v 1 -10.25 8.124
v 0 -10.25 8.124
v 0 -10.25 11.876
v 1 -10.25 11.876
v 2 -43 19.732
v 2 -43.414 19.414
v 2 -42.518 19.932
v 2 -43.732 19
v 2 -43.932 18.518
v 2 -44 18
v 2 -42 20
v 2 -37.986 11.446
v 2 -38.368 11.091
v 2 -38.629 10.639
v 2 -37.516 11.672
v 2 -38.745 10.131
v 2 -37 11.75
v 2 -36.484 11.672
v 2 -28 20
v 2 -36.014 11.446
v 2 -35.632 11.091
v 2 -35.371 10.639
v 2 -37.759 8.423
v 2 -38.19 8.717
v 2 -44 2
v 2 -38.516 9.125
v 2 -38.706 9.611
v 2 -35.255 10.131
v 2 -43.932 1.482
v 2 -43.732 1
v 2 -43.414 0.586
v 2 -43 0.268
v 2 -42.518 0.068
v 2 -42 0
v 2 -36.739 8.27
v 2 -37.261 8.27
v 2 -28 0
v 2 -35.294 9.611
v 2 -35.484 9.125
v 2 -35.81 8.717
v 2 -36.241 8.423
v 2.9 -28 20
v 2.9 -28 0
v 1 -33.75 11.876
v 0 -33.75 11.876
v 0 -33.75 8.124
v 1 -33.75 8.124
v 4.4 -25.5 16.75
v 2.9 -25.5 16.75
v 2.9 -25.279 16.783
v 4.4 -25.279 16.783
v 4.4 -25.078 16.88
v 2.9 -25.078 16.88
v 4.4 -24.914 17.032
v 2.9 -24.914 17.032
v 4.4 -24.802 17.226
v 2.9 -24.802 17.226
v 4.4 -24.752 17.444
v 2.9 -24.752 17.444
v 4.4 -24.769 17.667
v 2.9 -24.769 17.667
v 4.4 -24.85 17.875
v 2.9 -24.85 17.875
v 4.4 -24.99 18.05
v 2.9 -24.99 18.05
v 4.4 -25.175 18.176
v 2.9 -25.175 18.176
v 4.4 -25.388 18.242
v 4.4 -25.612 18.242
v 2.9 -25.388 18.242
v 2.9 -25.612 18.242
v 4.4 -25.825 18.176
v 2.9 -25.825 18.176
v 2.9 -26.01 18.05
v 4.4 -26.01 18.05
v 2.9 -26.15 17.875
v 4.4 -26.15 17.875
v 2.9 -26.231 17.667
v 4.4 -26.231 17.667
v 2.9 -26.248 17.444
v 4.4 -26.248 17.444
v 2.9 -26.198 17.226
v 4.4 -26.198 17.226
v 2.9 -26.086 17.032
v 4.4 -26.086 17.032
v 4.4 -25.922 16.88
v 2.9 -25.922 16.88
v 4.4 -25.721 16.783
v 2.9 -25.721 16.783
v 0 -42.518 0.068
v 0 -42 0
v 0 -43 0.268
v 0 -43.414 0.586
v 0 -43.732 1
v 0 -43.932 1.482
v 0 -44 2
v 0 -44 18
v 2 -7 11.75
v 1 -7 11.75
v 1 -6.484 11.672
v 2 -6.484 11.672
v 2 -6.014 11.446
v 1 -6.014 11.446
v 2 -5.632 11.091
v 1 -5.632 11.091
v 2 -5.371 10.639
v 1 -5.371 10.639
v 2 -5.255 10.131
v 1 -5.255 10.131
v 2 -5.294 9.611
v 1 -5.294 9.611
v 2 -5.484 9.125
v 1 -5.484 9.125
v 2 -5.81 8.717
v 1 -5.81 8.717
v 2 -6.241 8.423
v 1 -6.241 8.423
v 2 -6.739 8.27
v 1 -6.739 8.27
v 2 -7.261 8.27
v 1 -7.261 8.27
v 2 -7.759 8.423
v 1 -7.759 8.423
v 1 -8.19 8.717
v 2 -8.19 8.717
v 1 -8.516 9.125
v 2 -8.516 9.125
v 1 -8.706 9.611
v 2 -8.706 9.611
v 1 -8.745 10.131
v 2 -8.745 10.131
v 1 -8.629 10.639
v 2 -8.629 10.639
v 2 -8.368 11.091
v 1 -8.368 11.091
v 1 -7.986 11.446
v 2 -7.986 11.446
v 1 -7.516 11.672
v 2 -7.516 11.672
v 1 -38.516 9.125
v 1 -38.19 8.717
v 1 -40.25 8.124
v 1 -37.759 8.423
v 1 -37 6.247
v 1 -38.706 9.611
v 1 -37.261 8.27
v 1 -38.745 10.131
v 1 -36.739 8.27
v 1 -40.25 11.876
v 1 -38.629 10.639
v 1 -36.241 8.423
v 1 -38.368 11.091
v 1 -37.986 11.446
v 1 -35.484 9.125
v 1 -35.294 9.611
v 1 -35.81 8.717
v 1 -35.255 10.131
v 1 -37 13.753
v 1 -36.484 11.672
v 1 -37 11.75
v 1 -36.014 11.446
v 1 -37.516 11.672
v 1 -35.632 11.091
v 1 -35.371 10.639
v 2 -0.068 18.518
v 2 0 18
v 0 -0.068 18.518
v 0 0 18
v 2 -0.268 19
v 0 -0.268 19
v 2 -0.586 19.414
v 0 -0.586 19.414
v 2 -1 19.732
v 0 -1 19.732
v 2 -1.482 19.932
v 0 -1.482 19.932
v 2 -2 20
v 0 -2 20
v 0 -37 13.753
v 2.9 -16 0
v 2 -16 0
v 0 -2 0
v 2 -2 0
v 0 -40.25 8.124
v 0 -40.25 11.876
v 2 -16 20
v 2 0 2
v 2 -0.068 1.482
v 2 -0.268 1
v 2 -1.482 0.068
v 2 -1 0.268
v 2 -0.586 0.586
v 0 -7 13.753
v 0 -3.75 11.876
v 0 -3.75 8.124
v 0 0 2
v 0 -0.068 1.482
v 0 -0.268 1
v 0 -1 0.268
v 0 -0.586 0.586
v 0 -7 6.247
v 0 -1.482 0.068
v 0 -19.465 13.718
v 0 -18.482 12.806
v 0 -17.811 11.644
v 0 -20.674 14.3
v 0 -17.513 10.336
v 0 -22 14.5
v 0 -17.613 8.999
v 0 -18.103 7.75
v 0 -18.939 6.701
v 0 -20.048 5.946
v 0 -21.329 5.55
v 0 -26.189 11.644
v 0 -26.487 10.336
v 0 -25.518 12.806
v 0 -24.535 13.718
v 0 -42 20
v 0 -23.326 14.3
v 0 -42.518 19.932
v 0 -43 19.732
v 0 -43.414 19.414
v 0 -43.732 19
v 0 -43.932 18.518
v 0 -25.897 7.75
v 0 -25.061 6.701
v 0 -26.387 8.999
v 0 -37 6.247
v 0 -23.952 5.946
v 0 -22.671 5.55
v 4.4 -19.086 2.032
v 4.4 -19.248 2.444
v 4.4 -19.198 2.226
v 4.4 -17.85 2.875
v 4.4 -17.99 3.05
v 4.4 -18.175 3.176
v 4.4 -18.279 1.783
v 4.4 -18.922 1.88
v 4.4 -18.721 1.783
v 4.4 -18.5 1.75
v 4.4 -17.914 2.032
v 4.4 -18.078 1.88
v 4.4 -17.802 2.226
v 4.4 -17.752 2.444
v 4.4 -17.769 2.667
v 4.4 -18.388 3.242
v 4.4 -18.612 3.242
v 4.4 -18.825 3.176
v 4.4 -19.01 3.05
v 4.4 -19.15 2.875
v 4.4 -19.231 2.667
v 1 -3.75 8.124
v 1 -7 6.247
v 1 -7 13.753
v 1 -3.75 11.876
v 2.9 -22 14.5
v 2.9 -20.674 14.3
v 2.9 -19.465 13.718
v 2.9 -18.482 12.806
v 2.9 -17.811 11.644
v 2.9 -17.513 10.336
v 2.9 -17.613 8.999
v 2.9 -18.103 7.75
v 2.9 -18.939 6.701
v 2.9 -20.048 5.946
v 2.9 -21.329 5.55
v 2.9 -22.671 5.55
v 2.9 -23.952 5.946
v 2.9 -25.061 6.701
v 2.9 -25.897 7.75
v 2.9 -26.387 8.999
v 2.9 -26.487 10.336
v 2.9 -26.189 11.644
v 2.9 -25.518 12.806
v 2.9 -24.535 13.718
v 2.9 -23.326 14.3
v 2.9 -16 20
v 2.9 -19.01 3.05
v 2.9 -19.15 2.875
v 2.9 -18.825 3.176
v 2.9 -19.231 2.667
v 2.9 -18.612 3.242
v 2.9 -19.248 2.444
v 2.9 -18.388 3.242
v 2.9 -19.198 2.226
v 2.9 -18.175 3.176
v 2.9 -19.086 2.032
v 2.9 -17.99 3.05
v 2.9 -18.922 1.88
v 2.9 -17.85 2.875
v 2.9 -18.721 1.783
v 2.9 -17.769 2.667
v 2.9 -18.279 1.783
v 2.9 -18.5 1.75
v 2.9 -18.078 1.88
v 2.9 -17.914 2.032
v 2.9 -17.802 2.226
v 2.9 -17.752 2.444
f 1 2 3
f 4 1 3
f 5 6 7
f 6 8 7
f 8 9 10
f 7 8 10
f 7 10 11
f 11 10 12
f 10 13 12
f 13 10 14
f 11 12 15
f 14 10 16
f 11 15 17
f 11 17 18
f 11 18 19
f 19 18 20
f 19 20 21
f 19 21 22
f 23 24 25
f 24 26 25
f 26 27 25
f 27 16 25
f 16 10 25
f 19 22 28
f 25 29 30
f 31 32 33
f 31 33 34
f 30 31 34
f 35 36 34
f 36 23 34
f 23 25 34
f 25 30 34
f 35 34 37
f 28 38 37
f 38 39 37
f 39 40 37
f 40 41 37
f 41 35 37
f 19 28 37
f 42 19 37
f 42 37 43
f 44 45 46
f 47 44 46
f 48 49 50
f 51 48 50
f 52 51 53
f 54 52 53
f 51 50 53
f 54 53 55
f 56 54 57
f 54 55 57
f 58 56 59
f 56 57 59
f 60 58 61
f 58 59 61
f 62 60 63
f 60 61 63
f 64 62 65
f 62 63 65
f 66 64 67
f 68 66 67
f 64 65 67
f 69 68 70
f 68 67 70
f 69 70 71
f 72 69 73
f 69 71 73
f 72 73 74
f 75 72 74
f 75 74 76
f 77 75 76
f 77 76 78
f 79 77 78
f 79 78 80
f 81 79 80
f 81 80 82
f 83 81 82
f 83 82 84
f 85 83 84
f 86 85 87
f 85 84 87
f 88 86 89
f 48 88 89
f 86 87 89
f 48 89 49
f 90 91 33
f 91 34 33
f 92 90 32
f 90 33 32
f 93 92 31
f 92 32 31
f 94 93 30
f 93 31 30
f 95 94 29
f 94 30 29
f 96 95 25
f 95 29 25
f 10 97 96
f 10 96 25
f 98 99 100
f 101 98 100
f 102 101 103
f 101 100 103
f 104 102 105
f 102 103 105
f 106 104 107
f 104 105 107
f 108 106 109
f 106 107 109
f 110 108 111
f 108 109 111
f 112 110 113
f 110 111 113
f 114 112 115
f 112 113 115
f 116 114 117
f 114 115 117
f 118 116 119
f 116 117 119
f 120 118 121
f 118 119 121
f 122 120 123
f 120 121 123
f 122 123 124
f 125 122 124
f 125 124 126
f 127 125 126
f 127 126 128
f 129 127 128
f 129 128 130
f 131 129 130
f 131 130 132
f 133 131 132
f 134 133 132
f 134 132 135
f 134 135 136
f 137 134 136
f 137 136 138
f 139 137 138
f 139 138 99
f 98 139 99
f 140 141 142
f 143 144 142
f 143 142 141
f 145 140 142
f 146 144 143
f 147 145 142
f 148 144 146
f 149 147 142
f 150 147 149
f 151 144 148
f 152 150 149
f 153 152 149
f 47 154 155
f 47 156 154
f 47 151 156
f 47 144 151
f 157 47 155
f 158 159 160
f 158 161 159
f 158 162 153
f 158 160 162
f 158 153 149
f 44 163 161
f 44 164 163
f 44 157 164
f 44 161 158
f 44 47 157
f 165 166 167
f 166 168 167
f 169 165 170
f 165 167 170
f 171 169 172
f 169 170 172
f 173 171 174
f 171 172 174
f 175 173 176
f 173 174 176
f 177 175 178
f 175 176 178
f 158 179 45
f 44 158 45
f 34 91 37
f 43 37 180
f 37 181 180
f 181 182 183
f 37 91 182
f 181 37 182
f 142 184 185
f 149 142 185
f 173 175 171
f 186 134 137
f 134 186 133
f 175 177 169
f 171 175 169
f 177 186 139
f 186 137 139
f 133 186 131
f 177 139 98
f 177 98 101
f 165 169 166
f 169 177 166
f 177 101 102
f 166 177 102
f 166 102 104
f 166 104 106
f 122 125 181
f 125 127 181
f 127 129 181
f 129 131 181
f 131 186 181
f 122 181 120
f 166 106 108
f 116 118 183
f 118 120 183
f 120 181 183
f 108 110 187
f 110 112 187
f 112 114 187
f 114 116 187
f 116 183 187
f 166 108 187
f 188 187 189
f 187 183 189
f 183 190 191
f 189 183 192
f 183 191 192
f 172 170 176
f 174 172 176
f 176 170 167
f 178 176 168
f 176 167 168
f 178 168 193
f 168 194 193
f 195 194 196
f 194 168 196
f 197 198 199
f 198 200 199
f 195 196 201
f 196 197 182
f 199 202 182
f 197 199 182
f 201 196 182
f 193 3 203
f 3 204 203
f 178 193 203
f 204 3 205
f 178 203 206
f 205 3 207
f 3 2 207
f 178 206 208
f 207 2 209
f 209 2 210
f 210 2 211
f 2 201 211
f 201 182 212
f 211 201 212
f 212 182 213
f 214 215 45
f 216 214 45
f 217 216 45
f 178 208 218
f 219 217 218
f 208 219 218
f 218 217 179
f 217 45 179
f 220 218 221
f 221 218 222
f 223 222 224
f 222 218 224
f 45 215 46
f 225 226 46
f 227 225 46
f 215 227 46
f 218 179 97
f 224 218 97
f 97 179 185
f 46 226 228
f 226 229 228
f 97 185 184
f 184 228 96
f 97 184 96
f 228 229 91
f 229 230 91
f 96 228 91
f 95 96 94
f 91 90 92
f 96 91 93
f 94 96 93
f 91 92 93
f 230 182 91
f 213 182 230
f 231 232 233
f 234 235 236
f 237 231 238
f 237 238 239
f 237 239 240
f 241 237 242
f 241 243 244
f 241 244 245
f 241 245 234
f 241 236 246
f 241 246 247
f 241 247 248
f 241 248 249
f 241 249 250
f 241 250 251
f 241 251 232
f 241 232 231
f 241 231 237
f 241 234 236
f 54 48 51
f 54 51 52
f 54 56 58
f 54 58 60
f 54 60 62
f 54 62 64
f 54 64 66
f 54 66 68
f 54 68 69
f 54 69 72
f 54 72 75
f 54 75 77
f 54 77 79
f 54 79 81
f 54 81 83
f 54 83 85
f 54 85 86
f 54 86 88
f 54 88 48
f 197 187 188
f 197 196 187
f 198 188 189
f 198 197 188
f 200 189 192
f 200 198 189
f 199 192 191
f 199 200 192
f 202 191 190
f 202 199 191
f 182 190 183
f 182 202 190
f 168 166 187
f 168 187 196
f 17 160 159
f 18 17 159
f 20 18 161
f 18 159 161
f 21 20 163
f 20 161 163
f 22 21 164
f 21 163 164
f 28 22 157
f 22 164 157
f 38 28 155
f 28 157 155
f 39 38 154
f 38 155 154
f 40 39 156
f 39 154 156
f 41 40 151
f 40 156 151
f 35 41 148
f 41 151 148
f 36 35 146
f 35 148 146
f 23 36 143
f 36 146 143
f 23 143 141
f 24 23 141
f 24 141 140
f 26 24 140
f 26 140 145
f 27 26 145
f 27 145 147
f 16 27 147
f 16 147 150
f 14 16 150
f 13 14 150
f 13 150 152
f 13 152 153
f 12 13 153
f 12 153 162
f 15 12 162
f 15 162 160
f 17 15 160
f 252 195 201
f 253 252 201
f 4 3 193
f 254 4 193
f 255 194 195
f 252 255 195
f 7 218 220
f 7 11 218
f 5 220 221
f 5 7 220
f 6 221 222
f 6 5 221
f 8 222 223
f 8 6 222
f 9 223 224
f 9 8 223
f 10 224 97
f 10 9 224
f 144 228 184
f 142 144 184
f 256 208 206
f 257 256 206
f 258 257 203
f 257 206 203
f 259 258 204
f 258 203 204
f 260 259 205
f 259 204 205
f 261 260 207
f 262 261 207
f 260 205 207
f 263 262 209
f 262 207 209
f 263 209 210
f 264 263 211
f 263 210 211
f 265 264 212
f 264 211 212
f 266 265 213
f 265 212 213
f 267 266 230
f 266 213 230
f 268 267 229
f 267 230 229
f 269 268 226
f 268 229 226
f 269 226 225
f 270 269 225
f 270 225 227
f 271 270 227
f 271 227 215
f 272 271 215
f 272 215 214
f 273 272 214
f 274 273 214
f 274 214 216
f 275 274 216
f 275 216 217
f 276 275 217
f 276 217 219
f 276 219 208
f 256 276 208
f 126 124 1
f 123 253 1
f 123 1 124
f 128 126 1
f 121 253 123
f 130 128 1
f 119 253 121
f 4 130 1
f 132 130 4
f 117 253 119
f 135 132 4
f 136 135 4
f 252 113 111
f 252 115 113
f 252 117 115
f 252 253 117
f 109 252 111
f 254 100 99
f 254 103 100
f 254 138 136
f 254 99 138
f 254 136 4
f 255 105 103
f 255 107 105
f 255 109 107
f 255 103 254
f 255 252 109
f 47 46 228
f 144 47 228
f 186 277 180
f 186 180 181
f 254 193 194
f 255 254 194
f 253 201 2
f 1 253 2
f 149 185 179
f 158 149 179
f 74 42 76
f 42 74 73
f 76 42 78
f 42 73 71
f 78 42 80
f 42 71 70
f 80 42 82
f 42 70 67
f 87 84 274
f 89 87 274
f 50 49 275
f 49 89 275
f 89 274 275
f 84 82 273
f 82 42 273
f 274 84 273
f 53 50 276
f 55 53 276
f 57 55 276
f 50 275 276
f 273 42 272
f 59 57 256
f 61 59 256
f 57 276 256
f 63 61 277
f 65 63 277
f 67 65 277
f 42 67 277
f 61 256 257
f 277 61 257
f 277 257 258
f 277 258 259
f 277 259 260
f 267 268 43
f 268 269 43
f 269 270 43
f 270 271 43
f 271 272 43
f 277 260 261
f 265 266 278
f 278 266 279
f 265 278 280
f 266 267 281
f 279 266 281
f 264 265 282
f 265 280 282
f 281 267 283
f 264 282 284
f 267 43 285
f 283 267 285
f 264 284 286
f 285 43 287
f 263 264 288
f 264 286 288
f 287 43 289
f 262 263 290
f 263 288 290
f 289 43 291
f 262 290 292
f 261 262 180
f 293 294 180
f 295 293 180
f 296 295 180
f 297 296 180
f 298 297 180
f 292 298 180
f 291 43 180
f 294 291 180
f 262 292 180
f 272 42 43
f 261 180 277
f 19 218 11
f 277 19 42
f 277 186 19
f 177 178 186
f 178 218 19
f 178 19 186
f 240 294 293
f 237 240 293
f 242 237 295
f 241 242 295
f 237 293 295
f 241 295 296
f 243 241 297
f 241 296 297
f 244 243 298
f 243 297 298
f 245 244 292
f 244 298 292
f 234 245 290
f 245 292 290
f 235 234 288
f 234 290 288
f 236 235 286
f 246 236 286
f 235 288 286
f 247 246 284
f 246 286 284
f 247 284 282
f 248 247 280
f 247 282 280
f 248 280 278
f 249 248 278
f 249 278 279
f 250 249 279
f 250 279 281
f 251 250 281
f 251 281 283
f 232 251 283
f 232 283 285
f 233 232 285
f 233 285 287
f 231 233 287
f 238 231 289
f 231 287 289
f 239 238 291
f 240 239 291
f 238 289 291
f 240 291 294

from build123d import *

# Parameters (mm, degrees)
BOSS_EXTRUDE1_DEPTH = 20
SKETCH2_R           = 1.75
SKETCH2_R_2         = 4.5
CUT_EXTRUDE1_DEPTH  = 3.9
SKETCH3_R           = 0.75
BOSS_EXTRUDE2_DEPTH = 1.5
FILLET1_R           = 2
CUT_EXTRUDE2_DEPTH  = 1


with BuildPart() as part:
    # Sketch1 → Boss-Extrude1 (new body)
    with BuildSketch(Plane.XY):
        Polygon((0, 0), (0, -44), (2, -44), (2, -28), (2.9, -28), (2.9, -16), (2, -16), (2, 0), align=None)
    extrude(amount=BOSS_EXTRUDE1_DEPTH)

    # Sketch2 → Cut-Extrude1 (cut, through all)
    with BuildSketch(Plane.ZY):
        with Locations((10, -7)):
            Circle(SKETCH2_R)
        with Locations((10, -37)):
            Circle(SKETCH2_R)
        with Locations((10, -22)):
            Circle(SKETCH2_R_2)
    extrude(amount=-CUT_EXTRUDE1_DEPTH, mode=Mode.SUBTRACT)

    # Sketch3 → Boss-Extrude2 (add)
    with BuildSketch(Plane(origin=(2.9, 0, 0), x_dir=(0, 0, -1), z_dir=(1, 0, 0))):
        with Locations((-17.5, -25.5)):
            Circle(SKETCH3_R)
        with Locations((-2.5, -18.5)):
            Circle(SKETCH3_R)
    extrude(amount=BOSS_EXTRUDE2_DEPTH)

    # Fillet1
    fillet1_edges = [part.edges().sort_by_distance(p)[0] for p in [
        (1, -44, 20),
        (1, 0, 0),
        (1, 0, 20),
        (1, -44, 0),
    ]]
    fillet(fillet1_edges, radius=FILLET1_R)

    # Sketch4 → Cut-Extrude2 (cut)
    with BuildSketch(Plane.ZY):
        Polygon((11.876388375, -10.25), (13.75277675, -7), (11.876388375, -3.75), (8.123611625, -3.75), (6.24722325, -7), (8.123611625, -10.25), align=None)
        Polygon((11.876388375, -40.25), (13.75277675, -37), (11.876388375, -33.75), (8.123611625, -33.75), (6.24722325, -37), (8.123611625, -40.25), align=None)
    extrude(amount=-CUT_EXTRUDE2_DEPTH, mode=Mode.SUBTRACT)


solid = part.part
